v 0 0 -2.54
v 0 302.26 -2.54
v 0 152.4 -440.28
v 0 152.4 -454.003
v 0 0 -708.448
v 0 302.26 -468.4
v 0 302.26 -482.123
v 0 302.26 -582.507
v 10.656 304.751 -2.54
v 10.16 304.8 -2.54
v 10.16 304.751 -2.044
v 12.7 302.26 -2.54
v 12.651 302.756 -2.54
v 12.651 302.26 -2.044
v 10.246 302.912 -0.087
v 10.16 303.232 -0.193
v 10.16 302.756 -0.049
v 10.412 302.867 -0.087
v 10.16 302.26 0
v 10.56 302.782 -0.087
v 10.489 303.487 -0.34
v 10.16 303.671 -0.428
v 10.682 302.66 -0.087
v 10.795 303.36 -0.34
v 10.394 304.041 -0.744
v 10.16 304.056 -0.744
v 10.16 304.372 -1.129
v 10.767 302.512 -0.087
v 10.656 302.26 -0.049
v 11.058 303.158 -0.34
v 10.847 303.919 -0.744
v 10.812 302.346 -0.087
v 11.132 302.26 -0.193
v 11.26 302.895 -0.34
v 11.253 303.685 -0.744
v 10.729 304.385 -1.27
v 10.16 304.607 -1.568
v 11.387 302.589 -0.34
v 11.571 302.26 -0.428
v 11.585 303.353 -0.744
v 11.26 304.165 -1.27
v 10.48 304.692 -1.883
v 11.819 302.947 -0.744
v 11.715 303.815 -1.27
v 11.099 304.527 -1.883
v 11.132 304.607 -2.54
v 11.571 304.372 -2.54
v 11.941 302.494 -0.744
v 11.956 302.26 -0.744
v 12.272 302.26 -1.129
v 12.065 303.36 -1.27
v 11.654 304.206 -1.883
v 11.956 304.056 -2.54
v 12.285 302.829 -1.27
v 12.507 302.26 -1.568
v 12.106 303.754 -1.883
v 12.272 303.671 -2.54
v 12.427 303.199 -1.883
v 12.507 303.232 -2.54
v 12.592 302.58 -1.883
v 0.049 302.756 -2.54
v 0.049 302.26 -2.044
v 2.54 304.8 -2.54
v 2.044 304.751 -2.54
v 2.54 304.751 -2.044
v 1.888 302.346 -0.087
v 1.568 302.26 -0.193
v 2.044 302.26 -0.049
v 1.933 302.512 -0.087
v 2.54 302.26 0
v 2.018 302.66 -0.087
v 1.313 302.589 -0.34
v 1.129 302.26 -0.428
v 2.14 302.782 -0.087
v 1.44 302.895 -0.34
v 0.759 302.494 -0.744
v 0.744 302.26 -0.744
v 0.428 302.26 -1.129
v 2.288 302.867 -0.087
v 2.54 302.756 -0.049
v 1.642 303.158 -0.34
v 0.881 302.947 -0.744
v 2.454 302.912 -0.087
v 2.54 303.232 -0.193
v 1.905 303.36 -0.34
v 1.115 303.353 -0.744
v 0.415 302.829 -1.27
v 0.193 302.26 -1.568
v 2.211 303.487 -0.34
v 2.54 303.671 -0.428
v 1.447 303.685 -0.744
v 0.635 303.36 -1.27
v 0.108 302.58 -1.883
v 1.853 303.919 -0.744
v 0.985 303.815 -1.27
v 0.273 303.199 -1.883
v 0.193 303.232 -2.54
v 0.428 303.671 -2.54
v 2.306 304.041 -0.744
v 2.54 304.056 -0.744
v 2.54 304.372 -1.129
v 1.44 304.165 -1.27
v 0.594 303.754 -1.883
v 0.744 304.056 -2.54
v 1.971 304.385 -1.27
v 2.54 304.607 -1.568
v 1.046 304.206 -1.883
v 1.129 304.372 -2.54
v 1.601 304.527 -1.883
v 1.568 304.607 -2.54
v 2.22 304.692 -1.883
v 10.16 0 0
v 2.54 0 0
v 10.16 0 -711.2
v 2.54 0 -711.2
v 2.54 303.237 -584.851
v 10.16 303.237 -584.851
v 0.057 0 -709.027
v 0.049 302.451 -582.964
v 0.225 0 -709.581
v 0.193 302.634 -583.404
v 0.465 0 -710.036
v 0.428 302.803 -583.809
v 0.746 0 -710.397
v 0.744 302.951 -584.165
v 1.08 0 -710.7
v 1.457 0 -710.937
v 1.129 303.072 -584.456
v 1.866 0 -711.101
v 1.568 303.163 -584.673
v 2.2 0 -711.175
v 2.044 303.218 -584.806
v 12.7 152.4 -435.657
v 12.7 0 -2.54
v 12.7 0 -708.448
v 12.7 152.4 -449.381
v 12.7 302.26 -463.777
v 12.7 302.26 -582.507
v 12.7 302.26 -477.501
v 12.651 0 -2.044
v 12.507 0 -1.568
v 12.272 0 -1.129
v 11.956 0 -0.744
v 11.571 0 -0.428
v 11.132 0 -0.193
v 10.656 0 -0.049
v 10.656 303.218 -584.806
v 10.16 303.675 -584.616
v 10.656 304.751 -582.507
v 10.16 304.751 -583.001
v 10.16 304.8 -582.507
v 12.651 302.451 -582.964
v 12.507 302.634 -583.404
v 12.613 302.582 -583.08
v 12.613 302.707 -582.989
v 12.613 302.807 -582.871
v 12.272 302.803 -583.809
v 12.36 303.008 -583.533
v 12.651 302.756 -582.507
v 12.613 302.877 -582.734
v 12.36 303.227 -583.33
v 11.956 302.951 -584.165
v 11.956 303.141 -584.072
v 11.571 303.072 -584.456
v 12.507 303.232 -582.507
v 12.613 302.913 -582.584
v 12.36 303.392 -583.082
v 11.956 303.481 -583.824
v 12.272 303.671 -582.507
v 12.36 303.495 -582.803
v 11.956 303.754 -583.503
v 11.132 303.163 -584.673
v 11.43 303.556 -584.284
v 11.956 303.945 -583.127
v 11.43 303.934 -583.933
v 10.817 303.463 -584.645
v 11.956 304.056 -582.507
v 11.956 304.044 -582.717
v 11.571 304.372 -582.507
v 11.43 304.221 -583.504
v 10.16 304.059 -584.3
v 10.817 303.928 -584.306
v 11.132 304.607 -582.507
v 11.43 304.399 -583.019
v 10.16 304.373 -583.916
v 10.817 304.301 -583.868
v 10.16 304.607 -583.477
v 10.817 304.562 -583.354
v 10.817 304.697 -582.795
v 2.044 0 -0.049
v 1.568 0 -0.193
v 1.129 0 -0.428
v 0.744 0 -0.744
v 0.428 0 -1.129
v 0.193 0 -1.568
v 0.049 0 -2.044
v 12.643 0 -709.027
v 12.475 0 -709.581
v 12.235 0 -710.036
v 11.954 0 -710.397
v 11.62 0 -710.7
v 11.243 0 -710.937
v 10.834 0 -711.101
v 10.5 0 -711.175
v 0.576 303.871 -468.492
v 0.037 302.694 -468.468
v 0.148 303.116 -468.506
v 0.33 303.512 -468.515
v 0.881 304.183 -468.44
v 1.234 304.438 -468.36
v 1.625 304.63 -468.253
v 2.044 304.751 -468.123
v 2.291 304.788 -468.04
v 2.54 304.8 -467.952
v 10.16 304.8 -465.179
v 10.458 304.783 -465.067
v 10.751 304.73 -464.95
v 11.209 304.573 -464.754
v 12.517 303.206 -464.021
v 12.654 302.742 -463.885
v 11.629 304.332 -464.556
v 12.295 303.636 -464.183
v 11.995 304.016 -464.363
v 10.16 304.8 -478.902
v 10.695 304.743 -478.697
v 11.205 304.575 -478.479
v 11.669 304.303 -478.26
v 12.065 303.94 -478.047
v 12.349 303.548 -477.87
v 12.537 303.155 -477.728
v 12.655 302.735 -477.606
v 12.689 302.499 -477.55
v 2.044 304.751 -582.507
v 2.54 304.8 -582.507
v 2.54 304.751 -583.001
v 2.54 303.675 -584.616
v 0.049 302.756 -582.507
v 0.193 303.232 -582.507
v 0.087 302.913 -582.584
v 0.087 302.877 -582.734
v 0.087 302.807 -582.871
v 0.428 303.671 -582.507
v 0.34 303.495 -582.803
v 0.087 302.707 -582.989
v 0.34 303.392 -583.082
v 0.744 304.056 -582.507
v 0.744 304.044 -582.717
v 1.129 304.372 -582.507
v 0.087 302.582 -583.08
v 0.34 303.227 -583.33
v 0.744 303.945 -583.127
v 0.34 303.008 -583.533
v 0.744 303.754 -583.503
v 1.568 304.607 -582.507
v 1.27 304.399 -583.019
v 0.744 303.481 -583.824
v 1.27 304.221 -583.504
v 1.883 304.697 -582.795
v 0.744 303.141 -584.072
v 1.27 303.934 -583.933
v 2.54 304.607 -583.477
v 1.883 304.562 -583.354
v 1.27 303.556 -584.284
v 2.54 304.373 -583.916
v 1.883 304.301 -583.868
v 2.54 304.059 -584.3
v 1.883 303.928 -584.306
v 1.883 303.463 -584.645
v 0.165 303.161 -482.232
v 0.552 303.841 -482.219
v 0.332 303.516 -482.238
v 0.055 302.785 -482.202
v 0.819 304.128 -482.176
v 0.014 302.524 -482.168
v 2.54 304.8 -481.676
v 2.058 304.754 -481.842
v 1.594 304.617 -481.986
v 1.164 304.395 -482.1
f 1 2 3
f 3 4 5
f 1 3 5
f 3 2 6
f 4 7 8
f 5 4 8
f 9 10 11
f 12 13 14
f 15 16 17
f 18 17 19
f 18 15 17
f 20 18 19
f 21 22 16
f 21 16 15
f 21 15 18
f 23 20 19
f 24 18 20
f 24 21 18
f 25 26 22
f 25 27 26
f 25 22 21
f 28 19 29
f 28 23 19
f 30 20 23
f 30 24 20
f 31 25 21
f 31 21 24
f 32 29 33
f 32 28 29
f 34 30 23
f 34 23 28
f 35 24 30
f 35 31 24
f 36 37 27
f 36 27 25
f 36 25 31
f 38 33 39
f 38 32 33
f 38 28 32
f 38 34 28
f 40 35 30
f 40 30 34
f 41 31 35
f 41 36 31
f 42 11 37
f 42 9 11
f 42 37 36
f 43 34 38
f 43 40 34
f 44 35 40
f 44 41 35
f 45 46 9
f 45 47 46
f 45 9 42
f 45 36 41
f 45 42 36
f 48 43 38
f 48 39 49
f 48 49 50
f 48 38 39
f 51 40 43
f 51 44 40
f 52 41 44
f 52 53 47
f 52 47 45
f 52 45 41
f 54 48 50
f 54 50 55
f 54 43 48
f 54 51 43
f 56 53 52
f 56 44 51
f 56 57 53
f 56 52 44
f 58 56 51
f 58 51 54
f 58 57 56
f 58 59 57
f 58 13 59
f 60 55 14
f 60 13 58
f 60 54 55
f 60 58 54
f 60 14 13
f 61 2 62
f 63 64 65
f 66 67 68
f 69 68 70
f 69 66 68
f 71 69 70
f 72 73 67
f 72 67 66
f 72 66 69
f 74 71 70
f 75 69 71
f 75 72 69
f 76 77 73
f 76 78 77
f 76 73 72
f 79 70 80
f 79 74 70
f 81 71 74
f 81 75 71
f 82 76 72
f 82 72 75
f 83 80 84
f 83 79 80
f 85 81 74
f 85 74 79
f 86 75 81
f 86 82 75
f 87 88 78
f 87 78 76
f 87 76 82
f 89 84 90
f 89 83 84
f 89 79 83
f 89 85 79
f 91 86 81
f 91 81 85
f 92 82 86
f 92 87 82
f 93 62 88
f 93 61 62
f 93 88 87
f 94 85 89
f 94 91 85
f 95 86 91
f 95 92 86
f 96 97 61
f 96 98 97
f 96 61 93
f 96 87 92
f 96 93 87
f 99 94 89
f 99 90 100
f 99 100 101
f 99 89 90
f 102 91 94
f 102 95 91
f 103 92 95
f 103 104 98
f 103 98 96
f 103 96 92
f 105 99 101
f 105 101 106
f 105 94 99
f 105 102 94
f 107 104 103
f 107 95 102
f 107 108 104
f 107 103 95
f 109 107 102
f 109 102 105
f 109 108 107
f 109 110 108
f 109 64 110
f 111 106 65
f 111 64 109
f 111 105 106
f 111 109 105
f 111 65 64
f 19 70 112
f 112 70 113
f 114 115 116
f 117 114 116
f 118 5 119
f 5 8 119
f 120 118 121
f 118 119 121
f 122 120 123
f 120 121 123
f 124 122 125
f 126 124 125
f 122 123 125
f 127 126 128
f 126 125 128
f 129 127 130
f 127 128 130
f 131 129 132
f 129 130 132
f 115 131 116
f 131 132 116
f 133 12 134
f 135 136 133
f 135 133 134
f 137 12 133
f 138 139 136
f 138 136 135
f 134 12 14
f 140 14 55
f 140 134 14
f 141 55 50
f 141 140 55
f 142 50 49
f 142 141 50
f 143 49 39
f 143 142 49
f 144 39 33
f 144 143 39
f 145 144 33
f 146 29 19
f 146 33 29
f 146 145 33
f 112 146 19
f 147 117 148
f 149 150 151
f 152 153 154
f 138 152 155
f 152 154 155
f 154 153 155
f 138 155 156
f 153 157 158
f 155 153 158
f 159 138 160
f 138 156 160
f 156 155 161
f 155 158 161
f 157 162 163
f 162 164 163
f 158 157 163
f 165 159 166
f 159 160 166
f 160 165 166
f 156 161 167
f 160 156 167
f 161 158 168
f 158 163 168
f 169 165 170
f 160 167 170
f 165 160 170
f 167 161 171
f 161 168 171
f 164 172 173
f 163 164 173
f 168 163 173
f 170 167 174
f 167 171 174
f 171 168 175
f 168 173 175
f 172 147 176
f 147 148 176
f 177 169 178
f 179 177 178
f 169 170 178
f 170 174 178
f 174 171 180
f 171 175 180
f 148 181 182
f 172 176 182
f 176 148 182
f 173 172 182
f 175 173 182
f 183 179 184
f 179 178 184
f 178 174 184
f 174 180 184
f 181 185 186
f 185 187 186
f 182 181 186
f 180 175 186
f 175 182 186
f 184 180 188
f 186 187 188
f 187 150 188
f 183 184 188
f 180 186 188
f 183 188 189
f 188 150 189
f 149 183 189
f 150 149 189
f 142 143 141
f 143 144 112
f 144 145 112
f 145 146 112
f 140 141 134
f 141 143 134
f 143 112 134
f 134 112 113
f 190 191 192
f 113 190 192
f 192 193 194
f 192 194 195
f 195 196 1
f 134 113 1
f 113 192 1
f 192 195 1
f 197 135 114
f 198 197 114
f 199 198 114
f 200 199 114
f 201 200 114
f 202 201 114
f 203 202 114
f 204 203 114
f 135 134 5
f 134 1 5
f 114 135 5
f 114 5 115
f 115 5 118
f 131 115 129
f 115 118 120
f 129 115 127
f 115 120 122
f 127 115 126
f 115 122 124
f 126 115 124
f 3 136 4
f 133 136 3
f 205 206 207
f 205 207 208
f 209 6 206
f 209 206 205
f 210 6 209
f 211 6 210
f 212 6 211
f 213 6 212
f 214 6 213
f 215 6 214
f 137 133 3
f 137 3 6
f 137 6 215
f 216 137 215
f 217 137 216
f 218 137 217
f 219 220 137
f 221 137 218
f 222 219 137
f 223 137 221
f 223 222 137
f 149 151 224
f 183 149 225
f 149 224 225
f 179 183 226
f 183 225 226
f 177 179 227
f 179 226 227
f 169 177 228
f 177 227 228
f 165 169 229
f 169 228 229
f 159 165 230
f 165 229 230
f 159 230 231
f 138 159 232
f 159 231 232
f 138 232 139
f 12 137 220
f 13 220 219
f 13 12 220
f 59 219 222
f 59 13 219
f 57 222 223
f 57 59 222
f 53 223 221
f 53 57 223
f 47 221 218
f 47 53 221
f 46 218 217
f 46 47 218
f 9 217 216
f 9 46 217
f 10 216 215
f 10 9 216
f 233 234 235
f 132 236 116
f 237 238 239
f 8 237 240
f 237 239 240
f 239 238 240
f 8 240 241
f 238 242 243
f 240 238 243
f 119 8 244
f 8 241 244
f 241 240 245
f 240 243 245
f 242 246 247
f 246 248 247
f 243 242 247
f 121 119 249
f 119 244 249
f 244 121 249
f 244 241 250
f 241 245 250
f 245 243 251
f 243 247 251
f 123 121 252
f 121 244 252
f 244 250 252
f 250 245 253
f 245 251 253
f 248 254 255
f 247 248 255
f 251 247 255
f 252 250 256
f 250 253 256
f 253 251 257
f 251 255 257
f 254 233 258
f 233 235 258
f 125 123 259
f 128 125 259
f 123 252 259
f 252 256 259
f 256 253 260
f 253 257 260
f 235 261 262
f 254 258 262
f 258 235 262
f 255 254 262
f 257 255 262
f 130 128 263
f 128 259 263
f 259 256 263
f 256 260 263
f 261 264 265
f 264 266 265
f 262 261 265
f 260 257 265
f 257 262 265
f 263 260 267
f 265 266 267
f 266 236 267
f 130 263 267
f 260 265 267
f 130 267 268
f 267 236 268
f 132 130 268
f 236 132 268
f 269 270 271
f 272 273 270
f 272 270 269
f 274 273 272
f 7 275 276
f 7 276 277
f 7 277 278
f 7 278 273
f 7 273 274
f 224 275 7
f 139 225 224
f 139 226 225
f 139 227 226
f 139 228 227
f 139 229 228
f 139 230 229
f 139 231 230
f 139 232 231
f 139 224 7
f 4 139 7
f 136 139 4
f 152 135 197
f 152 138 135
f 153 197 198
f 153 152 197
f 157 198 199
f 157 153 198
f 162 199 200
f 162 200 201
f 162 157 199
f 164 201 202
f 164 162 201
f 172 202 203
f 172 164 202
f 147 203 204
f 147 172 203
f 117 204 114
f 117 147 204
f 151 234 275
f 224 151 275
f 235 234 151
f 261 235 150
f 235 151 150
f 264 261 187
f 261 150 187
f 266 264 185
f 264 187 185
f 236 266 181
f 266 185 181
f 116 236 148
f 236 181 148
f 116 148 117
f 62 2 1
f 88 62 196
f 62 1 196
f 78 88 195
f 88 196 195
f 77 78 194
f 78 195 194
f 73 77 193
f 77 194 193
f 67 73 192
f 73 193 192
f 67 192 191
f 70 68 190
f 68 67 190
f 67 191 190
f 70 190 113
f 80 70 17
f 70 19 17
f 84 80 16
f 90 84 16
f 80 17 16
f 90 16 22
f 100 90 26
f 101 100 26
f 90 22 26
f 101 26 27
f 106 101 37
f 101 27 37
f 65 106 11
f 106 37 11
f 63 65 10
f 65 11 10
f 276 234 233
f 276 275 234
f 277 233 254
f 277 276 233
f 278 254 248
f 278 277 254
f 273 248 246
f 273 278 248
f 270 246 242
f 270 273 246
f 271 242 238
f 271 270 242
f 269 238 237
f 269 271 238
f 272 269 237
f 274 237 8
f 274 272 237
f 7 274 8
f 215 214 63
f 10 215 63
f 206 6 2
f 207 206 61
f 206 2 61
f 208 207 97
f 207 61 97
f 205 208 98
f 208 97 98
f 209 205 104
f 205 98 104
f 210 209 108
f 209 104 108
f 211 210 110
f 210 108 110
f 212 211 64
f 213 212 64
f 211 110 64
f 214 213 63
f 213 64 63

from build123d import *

# Parameters (mm, degrees)
BOSS_EXTRUDE2_DEPTH = 12.7
CUT_EXTRUDE1_DEPTH  = 778.596755789
FILLET1_R           = 2.54


with BuildPart() as part:
    # Sketch1 → Boss-Extrude2 (new body)
    with BuildSketch(Plane(origin=(0, 0, 0), x_dir=(0, 0, -1), z_dir=(1, 0, 0))):
        Polygon((584.2, 304.8), (0, 304.8), (0, 0), (711.2, 0), align=None)
    extrude(amount=BOSS_EXTRUDE2_DEPTH)

    # Sketch3 → Cut-Extrude1 (cut, through all)
    with BuildSketch(Plane(origin=(11.214382214, 0, 4.081701322), x_dir=(0, 1, 0), z_dir=(0.9396926207859083, 0, 0.34202014332566943))):
        Polygon((304.8, -453.495658666), (152.4, -426.623426806), (152.4, -413.727508835), (304.8, -440.599740695), align=None)
    extrude(amount=-CUT_EXTRUDE1_DEPTH, mode=Mode.SUBTRACT)

    # Fillet1
    fillet1_edges = [part.edges().sort_by_distance(p)[0] for p in [
        (0, 304.8, -234.438225303),
        (0, 152.4, -647.7),
        (0, 152.4, 0),
        (12.7, 304.8, -232.127014316),
        (6.35, 304.8, -584.2),
        (6.35, 304.8, 0),
        (12.7, 152.4, 0),
        (12.7, 152.4, -647.7),
        (12.7, 304.8, -531.088788946),
        (0, 304.8, -533.399999933),
    ]]
    fillet(fillet1_edges, radius=FILLET1_R)


solid = part.part
